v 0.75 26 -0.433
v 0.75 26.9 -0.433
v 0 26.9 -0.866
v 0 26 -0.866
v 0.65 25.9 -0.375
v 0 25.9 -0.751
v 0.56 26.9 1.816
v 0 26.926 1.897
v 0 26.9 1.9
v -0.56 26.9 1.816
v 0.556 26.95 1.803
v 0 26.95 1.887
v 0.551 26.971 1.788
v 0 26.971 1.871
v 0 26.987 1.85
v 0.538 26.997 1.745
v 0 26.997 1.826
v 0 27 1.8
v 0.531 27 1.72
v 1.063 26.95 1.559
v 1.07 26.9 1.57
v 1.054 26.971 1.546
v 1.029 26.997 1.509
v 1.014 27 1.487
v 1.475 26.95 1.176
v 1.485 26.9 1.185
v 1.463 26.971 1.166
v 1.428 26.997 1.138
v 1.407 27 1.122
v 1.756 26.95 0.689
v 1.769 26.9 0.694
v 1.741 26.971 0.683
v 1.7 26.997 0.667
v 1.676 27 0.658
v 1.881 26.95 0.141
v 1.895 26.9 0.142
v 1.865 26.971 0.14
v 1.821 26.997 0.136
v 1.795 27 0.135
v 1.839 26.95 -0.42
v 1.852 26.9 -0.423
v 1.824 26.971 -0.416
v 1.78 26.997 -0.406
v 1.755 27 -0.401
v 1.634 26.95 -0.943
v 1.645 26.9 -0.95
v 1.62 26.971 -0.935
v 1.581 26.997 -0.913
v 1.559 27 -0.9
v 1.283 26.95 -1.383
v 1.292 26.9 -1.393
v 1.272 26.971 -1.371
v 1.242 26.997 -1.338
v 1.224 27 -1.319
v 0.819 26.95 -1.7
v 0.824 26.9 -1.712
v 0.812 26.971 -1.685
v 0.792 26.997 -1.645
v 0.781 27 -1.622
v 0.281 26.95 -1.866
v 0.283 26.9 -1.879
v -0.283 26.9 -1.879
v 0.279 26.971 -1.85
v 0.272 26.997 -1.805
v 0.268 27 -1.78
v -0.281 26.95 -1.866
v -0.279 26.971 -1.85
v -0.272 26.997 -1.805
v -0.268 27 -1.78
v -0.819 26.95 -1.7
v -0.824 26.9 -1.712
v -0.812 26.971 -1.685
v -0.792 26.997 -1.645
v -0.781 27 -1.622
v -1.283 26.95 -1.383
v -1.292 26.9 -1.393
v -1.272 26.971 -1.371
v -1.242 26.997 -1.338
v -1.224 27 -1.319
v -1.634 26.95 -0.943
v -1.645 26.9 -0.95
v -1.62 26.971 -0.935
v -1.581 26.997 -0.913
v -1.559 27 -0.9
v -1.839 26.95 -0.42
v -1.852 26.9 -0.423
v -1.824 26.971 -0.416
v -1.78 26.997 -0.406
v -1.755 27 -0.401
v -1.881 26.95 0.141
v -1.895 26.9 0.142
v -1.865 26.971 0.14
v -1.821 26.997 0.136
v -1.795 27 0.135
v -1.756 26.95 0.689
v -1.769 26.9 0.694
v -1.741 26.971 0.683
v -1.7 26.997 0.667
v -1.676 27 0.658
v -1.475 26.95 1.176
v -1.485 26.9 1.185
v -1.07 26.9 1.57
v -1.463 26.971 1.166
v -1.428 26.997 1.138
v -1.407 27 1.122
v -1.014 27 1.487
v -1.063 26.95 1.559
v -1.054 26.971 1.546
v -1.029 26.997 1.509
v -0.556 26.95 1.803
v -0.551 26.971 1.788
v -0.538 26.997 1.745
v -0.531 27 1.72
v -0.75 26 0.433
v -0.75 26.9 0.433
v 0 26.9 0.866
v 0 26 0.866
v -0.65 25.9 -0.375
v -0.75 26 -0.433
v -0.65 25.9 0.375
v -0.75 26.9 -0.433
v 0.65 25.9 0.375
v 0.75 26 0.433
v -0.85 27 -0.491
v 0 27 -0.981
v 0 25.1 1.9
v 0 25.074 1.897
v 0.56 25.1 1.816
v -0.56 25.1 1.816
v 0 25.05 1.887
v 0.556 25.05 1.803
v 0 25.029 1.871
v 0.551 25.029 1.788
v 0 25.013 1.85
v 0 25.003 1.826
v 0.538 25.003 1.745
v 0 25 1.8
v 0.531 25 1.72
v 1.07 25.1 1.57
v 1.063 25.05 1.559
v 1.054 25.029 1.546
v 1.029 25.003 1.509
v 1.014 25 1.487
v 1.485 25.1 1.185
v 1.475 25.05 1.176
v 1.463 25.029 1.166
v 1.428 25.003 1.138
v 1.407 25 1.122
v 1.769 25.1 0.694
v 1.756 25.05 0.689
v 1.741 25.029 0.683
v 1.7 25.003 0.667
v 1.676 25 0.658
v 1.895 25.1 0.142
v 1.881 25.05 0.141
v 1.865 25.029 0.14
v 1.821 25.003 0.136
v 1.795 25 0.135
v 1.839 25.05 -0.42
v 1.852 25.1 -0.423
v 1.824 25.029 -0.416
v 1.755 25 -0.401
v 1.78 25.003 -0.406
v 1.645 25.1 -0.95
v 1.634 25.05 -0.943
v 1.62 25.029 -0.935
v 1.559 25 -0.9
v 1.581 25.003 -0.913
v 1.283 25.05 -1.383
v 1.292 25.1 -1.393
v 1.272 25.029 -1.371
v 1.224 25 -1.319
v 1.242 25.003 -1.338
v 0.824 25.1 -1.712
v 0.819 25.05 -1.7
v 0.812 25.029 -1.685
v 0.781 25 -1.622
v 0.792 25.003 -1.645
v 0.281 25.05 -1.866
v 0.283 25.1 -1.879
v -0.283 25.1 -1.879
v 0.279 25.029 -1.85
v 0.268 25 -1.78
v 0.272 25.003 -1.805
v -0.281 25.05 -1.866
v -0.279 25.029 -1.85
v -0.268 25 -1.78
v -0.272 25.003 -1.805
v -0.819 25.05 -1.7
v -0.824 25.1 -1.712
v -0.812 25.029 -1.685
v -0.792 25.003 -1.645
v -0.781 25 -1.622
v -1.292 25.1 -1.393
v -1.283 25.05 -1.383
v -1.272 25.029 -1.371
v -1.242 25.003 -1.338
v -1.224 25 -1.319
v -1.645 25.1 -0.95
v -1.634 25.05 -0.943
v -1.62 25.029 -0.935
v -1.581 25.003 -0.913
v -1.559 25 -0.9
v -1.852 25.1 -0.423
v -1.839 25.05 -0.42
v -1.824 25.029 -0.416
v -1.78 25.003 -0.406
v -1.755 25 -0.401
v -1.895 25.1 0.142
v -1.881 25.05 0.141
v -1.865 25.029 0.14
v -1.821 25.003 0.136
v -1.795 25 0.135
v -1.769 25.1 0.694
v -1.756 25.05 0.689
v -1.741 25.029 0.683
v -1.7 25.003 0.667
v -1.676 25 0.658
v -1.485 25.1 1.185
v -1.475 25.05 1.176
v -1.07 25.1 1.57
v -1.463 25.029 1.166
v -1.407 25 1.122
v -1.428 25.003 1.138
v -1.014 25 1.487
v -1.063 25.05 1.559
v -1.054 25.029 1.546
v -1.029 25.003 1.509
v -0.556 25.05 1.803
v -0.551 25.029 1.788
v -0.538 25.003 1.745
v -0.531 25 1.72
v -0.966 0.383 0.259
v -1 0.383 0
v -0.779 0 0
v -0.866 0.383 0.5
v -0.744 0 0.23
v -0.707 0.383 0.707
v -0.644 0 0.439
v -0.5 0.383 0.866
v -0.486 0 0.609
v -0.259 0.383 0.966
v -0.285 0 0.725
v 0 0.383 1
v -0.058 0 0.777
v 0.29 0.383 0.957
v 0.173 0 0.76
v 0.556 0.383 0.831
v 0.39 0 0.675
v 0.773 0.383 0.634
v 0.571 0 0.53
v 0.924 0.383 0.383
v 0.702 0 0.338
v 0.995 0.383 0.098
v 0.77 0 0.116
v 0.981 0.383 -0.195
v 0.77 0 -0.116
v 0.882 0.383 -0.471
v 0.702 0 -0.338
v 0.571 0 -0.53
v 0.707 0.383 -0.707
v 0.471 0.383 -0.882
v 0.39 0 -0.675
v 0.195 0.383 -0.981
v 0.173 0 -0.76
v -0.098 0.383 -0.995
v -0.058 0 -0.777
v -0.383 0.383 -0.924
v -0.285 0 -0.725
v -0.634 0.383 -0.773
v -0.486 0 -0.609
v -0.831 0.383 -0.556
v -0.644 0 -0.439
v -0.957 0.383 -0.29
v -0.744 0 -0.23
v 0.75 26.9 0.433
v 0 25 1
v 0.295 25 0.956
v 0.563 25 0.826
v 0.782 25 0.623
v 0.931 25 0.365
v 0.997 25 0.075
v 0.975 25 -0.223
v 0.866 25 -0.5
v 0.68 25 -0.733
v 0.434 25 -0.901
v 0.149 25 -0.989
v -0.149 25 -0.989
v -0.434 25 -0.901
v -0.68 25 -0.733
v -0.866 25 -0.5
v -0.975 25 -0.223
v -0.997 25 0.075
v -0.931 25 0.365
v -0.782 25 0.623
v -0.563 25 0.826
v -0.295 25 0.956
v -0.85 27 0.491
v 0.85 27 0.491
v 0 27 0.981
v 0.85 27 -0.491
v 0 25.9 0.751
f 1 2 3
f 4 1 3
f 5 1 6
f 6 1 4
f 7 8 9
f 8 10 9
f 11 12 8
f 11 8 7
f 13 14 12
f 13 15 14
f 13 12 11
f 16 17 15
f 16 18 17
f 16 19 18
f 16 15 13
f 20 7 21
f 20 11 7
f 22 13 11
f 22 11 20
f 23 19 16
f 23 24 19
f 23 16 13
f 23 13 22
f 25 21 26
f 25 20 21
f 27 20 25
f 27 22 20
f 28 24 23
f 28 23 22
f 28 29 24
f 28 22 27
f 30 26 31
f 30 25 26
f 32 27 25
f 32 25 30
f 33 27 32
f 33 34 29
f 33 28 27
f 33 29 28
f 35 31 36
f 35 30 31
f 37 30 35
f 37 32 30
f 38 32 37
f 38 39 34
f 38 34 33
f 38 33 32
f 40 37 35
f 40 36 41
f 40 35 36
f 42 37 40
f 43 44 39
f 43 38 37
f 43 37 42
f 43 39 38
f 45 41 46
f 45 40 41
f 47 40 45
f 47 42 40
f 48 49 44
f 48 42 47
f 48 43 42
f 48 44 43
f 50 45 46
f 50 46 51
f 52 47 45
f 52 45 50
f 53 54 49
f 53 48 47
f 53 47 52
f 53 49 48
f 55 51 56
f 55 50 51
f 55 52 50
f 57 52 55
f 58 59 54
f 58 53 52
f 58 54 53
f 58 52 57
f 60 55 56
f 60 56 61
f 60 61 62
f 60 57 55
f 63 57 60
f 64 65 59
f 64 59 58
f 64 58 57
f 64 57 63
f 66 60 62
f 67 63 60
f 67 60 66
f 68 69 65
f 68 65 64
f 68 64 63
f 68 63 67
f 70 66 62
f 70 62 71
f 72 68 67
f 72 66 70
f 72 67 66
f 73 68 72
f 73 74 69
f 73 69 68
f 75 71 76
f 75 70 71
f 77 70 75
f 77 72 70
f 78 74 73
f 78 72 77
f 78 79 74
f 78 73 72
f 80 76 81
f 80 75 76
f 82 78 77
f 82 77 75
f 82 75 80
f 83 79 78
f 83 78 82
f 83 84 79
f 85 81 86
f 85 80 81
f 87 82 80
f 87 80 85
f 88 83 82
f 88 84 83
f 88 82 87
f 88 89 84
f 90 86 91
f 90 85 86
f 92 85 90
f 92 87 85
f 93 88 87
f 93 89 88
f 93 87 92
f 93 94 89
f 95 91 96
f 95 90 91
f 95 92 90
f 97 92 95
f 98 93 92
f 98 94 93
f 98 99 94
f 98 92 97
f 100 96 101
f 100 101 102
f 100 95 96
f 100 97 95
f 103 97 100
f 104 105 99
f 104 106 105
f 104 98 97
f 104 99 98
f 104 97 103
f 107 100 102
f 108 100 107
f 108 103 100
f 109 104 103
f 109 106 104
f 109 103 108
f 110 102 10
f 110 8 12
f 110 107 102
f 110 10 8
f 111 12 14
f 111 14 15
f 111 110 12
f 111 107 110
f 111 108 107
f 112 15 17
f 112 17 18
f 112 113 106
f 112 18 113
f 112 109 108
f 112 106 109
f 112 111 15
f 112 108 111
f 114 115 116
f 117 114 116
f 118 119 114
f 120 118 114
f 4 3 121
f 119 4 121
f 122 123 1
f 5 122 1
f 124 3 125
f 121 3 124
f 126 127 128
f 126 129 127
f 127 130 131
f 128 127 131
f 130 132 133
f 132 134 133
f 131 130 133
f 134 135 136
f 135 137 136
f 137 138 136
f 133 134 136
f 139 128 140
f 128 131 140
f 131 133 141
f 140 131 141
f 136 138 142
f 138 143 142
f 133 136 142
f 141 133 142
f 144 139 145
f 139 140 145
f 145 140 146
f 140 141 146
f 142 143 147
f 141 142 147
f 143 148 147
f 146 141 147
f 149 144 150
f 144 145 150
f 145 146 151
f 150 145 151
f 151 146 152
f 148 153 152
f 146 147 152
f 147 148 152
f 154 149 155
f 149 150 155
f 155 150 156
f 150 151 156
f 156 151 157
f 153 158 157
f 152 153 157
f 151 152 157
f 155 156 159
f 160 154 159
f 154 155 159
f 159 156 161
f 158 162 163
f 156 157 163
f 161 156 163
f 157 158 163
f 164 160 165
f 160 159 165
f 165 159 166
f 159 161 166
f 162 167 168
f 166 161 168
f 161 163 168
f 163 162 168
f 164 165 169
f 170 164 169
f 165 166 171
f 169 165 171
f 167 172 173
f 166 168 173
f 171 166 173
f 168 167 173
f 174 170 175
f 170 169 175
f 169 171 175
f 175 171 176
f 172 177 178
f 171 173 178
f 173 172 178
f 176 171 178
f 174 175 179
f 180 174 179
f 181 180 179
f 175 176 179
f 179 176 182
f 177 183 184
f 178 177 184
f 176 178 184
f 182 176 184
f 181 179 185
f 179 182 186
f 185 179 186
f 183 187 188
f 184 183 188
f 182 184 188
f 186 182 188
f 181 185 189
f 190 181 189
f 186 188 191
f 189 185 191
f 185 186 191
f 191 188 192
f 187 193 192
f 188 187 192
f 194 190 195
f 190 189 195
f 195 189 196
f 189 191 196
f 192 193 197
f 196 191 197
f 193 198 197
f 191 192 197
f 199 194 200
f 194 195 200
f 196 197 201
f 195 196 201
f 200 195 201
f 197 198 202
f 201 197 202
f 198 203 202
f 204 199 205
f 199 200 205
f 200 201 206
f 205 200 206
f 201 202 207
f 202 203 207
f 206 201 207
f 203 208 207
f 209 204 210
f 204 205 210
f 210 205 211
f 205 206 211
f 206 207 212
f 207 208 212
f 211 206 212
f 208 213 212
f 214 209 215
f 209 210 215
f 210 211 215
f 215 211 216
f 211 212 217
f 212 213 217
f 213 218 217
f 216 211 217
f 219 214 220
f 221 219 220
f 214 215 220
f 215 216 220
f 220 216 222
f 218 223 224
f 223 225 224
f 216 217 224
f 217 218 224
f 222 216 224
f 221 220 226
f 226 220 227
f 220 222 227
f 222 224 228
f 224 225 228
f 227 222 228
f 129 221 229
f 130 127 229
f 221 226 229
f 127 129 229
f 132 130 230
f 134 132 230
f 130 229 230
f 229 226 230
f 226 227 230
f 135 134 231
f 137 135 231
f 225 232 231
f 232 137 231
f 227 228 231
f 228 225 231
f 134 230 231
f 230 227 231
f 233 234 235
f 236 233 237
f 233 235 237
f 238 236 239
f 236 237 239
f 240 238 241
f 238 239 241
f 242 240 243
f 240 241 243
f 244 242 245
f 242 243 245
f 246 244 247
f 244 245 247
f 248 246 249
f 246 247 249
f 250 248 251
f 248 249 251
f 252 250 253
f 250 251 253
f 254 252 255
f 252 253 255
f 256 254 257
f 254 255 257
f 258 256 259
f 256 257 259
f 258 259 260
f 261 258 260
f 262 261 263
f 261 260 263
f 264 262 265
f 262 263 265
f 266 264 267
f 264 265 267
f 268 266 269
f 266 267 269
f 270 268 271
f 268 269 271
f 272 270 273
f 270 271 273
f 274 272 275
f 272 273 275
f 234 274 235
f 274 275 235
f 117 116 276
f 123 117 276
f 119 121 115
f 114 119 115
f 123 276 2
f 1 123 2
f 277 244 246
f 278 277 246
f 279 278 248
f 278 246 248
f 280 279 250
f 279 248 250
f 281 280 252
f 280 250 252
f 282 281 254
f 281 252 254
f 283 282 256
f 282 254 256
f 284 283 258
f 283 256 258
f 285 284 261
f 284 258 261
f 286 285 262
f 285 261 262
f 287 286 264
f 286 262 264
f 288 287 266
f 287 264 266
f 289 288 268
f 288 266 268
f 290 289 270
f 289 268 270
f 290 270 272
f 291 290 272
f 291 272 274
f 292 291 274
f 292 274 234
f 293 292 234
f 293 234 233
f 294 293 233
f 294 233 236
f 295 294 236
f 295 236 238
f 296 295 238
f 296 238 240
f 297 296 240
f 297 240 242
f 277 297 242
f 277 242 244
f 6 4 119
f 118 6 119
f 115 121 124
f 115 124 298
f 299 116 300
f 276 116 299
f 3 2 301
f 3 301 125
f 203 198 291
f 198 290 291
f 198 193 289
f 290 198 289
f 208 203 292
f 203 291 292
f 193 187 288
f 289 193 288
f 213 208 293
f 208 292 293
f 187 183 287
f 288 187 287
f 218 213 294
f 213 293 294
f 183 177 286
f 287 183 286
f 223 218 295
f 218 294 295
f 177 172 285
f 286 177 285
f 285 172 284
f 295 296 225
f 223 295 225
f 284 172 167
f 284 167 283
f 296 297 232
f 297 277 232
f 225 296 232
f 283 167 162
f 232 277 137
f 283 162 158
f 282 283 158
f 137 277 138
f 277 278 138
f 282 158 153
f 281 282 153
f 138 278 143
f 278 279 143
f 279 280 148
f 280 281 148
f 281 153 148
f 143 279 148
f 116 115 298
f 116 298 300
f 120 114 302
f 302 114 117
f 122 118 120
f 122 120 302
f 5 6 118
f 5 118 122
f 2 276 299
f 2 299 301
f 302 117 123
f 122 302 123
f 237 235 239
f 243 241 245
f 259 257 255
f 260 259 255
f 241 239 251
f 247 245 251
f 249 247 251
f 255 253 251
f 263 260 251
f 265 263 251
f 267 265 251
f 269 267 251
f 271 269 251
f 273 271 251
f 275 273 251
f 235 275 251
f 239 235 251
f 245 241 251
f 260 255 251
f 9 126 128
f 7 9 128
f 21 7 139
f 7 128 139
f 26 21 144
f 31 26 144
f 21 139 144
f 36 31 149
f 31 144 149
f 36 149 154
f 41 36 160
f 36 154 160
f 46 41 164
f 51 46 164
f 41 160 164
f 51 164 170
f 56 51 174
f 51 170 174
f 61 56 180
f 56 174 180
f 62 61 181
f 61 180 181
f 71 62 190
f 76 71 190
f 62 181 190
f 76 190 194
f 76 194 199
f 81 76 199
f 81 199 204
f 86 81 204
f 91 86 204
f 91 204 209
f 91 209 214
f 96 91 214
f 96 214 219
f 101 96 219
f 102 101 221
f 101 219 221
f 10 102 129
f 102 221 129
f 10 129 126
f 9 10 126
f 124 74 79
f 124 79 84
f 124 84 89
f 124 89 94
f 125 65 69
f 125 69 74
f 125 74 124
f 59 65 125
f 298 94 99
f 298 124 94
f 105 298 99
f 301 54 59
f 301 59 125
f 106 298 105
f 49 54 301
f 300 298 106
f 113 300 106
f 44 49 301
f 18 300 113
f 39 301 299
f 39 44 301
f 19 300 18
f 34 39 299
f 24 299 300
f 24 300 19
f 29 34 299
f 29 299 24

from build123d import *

# Parameters (mm, degrees)
SKETCH1_R           = 1
BOSS_EXTRUDE1_DEPTH = 25
SKETCH2_R           = 1.9
BOSS_EXTRUDE2_DEPTH = 2
CUT_EXTRUDE1_DEPTH  = 1
FILLET1_R           = 0.1
CHAMFER1_SIZE       = 0.1
CHAMFER2_SIZE       = 0.1
CUT_EXTRUDE2_DEPTH  = 0.1
CUT_EXTRUDE2_DRAFT  = -45


with BuildPart() as part:
    # Sketch1 → Boss-Extrude1 (new body)
    with BuildSketch(Plane(origin=(0, 0, 0), x_dir=(1, 0, 0), z_dir=(0, 1, 0))):
        with Locations(Location((0, 0, 0), (0, 0, 270))):
            Circle(SKETCH1_R)
    extrude(amount=BOSS_EXTRUDE1_DEPTH)

    # Sketch2 → Boss-Extrude2 (add)
    with BuildSketch(Plane(origin=(0, 25, 0), x_dir=(1, 0, 0), z_dir=(0, 1, 0))):
        with Locations(Location((0, 0, 0), (0, 0, 270))):
            Circle(SKETCH2_R)
    extrude(amount=BOSS_EXTRUDE2_DEPTH)

    # Sketch3 → Cut-Extrude1 (cut)
    with BuildSketch(Plane(origin=(0, 27, 0), x_dir=(1, 0, 0), z_dir=(0, 1, 0))):
        Polygon((0, 0.866025404), (-0.75, 0.433012702), (-0.75, -0.433012702), (0, -0.866025404), (0.75, -0.433012702), (0.75, 0.433012702), align=None)
    extrude(amount=-CUT_EXTRUDE1_DEPTH, mode=Mode.SUBTRACT)

    # Fillet1
    fillet1_edges = [part.edges().sort_by_distance(p)[0] for p in [
        (0, 25, -1.9),
        (0, 27, -1.9),
    ]]
    fillet(fillet1_edges, radius=FILLET1_R)

    # Chamfer1
    chamfer1_edges = [part.edges().sort_by_distance(p)[0] for p in [
        (0, 0, -1),
    ]]
    chamfer(chamfer1_edges, length=CHAMFER1_SIZE)

    # Sketch4 → Cut-Revolve1 (revolve, cut)
    with BuildSketch(Plane.XY, mode=Mode.PRIVATE) as cut_revolve1_sk:
        Polygon((1.01, 0), (1.01, 0.4), (0.779059892, 0), align=None)
    revolve(cut_revolve1_sk.sketch.rotate(Axis((0, 0, 0), (0, 1, 0)), 180), axis=Axis((0, 0, 0), (0, 1, 0)), mode=Mode.SUBTRACT)

    # Chamfer2
    chamfer2_edges = [part.edges().sort_by_distance(p)[0] for p in [
        (0.375, 27, -0.649519053),
        (-0.375, 27, -0.649519053),
        (-0.75, 27, 0),
        (-0.375, 27, 0.649519053),
        (0.375, 27, 0.649519053),
        (0.75, 27, 0),
    ]]
    chamfer(chamfer2_edges, length=CHAMFER2_SIZE)


with BuildPart() as cut_extrude2_tool:
    # Sketch6 → Cut-Extrude2 (with draft: the straight prism first)
    with BuildSketch(Plane(origin=(0, 26, 0), x_dir=(1, 0, 0), z_dir=(0, 1, 0))):
        Polygon((0, 0.866025404), (-0.75, 0.433012702), (-0.75, -0.433012702), (0, -0.866025404), (0.75, -0.433012702), (0.75, 0.433012702), align=None)
    extrude(amount=-CUT_EXTRUDE2_DEPTH)
    # Cut-Extrude2: the draft: its side faces are tilted about the plane it starts from
    cut_extrude2_sides = [cut_extrude2_tool.faces().sort_by_distance(p)[0] for p in [
        (-0.375, 25.95, -0.649519053),
        (-0.75, 25.95, 0),
        (-0.375, 25.95, 0.649519053),
        (0.375, 25.95, 0.649519053),
        (0.75, 25.95, 0),
        (0.375, 25.95, -0.649519053),
    ]]
    draft(cut_extrude2_sides, Plane(origin=(0, 26, 0), x_dir=(1, 0, 0), z_dir=(0, 1, 0)), CUT_EXTRUDE2_DRAFT)


with BuildPart() as part_1:
    add(part.part)

    # Cut-Extrude2: cut by cut_extrude2_tool
    add(cut_extrude2_tool.part, mode=Mode.SUBTRACT)


solid = part_1.part
